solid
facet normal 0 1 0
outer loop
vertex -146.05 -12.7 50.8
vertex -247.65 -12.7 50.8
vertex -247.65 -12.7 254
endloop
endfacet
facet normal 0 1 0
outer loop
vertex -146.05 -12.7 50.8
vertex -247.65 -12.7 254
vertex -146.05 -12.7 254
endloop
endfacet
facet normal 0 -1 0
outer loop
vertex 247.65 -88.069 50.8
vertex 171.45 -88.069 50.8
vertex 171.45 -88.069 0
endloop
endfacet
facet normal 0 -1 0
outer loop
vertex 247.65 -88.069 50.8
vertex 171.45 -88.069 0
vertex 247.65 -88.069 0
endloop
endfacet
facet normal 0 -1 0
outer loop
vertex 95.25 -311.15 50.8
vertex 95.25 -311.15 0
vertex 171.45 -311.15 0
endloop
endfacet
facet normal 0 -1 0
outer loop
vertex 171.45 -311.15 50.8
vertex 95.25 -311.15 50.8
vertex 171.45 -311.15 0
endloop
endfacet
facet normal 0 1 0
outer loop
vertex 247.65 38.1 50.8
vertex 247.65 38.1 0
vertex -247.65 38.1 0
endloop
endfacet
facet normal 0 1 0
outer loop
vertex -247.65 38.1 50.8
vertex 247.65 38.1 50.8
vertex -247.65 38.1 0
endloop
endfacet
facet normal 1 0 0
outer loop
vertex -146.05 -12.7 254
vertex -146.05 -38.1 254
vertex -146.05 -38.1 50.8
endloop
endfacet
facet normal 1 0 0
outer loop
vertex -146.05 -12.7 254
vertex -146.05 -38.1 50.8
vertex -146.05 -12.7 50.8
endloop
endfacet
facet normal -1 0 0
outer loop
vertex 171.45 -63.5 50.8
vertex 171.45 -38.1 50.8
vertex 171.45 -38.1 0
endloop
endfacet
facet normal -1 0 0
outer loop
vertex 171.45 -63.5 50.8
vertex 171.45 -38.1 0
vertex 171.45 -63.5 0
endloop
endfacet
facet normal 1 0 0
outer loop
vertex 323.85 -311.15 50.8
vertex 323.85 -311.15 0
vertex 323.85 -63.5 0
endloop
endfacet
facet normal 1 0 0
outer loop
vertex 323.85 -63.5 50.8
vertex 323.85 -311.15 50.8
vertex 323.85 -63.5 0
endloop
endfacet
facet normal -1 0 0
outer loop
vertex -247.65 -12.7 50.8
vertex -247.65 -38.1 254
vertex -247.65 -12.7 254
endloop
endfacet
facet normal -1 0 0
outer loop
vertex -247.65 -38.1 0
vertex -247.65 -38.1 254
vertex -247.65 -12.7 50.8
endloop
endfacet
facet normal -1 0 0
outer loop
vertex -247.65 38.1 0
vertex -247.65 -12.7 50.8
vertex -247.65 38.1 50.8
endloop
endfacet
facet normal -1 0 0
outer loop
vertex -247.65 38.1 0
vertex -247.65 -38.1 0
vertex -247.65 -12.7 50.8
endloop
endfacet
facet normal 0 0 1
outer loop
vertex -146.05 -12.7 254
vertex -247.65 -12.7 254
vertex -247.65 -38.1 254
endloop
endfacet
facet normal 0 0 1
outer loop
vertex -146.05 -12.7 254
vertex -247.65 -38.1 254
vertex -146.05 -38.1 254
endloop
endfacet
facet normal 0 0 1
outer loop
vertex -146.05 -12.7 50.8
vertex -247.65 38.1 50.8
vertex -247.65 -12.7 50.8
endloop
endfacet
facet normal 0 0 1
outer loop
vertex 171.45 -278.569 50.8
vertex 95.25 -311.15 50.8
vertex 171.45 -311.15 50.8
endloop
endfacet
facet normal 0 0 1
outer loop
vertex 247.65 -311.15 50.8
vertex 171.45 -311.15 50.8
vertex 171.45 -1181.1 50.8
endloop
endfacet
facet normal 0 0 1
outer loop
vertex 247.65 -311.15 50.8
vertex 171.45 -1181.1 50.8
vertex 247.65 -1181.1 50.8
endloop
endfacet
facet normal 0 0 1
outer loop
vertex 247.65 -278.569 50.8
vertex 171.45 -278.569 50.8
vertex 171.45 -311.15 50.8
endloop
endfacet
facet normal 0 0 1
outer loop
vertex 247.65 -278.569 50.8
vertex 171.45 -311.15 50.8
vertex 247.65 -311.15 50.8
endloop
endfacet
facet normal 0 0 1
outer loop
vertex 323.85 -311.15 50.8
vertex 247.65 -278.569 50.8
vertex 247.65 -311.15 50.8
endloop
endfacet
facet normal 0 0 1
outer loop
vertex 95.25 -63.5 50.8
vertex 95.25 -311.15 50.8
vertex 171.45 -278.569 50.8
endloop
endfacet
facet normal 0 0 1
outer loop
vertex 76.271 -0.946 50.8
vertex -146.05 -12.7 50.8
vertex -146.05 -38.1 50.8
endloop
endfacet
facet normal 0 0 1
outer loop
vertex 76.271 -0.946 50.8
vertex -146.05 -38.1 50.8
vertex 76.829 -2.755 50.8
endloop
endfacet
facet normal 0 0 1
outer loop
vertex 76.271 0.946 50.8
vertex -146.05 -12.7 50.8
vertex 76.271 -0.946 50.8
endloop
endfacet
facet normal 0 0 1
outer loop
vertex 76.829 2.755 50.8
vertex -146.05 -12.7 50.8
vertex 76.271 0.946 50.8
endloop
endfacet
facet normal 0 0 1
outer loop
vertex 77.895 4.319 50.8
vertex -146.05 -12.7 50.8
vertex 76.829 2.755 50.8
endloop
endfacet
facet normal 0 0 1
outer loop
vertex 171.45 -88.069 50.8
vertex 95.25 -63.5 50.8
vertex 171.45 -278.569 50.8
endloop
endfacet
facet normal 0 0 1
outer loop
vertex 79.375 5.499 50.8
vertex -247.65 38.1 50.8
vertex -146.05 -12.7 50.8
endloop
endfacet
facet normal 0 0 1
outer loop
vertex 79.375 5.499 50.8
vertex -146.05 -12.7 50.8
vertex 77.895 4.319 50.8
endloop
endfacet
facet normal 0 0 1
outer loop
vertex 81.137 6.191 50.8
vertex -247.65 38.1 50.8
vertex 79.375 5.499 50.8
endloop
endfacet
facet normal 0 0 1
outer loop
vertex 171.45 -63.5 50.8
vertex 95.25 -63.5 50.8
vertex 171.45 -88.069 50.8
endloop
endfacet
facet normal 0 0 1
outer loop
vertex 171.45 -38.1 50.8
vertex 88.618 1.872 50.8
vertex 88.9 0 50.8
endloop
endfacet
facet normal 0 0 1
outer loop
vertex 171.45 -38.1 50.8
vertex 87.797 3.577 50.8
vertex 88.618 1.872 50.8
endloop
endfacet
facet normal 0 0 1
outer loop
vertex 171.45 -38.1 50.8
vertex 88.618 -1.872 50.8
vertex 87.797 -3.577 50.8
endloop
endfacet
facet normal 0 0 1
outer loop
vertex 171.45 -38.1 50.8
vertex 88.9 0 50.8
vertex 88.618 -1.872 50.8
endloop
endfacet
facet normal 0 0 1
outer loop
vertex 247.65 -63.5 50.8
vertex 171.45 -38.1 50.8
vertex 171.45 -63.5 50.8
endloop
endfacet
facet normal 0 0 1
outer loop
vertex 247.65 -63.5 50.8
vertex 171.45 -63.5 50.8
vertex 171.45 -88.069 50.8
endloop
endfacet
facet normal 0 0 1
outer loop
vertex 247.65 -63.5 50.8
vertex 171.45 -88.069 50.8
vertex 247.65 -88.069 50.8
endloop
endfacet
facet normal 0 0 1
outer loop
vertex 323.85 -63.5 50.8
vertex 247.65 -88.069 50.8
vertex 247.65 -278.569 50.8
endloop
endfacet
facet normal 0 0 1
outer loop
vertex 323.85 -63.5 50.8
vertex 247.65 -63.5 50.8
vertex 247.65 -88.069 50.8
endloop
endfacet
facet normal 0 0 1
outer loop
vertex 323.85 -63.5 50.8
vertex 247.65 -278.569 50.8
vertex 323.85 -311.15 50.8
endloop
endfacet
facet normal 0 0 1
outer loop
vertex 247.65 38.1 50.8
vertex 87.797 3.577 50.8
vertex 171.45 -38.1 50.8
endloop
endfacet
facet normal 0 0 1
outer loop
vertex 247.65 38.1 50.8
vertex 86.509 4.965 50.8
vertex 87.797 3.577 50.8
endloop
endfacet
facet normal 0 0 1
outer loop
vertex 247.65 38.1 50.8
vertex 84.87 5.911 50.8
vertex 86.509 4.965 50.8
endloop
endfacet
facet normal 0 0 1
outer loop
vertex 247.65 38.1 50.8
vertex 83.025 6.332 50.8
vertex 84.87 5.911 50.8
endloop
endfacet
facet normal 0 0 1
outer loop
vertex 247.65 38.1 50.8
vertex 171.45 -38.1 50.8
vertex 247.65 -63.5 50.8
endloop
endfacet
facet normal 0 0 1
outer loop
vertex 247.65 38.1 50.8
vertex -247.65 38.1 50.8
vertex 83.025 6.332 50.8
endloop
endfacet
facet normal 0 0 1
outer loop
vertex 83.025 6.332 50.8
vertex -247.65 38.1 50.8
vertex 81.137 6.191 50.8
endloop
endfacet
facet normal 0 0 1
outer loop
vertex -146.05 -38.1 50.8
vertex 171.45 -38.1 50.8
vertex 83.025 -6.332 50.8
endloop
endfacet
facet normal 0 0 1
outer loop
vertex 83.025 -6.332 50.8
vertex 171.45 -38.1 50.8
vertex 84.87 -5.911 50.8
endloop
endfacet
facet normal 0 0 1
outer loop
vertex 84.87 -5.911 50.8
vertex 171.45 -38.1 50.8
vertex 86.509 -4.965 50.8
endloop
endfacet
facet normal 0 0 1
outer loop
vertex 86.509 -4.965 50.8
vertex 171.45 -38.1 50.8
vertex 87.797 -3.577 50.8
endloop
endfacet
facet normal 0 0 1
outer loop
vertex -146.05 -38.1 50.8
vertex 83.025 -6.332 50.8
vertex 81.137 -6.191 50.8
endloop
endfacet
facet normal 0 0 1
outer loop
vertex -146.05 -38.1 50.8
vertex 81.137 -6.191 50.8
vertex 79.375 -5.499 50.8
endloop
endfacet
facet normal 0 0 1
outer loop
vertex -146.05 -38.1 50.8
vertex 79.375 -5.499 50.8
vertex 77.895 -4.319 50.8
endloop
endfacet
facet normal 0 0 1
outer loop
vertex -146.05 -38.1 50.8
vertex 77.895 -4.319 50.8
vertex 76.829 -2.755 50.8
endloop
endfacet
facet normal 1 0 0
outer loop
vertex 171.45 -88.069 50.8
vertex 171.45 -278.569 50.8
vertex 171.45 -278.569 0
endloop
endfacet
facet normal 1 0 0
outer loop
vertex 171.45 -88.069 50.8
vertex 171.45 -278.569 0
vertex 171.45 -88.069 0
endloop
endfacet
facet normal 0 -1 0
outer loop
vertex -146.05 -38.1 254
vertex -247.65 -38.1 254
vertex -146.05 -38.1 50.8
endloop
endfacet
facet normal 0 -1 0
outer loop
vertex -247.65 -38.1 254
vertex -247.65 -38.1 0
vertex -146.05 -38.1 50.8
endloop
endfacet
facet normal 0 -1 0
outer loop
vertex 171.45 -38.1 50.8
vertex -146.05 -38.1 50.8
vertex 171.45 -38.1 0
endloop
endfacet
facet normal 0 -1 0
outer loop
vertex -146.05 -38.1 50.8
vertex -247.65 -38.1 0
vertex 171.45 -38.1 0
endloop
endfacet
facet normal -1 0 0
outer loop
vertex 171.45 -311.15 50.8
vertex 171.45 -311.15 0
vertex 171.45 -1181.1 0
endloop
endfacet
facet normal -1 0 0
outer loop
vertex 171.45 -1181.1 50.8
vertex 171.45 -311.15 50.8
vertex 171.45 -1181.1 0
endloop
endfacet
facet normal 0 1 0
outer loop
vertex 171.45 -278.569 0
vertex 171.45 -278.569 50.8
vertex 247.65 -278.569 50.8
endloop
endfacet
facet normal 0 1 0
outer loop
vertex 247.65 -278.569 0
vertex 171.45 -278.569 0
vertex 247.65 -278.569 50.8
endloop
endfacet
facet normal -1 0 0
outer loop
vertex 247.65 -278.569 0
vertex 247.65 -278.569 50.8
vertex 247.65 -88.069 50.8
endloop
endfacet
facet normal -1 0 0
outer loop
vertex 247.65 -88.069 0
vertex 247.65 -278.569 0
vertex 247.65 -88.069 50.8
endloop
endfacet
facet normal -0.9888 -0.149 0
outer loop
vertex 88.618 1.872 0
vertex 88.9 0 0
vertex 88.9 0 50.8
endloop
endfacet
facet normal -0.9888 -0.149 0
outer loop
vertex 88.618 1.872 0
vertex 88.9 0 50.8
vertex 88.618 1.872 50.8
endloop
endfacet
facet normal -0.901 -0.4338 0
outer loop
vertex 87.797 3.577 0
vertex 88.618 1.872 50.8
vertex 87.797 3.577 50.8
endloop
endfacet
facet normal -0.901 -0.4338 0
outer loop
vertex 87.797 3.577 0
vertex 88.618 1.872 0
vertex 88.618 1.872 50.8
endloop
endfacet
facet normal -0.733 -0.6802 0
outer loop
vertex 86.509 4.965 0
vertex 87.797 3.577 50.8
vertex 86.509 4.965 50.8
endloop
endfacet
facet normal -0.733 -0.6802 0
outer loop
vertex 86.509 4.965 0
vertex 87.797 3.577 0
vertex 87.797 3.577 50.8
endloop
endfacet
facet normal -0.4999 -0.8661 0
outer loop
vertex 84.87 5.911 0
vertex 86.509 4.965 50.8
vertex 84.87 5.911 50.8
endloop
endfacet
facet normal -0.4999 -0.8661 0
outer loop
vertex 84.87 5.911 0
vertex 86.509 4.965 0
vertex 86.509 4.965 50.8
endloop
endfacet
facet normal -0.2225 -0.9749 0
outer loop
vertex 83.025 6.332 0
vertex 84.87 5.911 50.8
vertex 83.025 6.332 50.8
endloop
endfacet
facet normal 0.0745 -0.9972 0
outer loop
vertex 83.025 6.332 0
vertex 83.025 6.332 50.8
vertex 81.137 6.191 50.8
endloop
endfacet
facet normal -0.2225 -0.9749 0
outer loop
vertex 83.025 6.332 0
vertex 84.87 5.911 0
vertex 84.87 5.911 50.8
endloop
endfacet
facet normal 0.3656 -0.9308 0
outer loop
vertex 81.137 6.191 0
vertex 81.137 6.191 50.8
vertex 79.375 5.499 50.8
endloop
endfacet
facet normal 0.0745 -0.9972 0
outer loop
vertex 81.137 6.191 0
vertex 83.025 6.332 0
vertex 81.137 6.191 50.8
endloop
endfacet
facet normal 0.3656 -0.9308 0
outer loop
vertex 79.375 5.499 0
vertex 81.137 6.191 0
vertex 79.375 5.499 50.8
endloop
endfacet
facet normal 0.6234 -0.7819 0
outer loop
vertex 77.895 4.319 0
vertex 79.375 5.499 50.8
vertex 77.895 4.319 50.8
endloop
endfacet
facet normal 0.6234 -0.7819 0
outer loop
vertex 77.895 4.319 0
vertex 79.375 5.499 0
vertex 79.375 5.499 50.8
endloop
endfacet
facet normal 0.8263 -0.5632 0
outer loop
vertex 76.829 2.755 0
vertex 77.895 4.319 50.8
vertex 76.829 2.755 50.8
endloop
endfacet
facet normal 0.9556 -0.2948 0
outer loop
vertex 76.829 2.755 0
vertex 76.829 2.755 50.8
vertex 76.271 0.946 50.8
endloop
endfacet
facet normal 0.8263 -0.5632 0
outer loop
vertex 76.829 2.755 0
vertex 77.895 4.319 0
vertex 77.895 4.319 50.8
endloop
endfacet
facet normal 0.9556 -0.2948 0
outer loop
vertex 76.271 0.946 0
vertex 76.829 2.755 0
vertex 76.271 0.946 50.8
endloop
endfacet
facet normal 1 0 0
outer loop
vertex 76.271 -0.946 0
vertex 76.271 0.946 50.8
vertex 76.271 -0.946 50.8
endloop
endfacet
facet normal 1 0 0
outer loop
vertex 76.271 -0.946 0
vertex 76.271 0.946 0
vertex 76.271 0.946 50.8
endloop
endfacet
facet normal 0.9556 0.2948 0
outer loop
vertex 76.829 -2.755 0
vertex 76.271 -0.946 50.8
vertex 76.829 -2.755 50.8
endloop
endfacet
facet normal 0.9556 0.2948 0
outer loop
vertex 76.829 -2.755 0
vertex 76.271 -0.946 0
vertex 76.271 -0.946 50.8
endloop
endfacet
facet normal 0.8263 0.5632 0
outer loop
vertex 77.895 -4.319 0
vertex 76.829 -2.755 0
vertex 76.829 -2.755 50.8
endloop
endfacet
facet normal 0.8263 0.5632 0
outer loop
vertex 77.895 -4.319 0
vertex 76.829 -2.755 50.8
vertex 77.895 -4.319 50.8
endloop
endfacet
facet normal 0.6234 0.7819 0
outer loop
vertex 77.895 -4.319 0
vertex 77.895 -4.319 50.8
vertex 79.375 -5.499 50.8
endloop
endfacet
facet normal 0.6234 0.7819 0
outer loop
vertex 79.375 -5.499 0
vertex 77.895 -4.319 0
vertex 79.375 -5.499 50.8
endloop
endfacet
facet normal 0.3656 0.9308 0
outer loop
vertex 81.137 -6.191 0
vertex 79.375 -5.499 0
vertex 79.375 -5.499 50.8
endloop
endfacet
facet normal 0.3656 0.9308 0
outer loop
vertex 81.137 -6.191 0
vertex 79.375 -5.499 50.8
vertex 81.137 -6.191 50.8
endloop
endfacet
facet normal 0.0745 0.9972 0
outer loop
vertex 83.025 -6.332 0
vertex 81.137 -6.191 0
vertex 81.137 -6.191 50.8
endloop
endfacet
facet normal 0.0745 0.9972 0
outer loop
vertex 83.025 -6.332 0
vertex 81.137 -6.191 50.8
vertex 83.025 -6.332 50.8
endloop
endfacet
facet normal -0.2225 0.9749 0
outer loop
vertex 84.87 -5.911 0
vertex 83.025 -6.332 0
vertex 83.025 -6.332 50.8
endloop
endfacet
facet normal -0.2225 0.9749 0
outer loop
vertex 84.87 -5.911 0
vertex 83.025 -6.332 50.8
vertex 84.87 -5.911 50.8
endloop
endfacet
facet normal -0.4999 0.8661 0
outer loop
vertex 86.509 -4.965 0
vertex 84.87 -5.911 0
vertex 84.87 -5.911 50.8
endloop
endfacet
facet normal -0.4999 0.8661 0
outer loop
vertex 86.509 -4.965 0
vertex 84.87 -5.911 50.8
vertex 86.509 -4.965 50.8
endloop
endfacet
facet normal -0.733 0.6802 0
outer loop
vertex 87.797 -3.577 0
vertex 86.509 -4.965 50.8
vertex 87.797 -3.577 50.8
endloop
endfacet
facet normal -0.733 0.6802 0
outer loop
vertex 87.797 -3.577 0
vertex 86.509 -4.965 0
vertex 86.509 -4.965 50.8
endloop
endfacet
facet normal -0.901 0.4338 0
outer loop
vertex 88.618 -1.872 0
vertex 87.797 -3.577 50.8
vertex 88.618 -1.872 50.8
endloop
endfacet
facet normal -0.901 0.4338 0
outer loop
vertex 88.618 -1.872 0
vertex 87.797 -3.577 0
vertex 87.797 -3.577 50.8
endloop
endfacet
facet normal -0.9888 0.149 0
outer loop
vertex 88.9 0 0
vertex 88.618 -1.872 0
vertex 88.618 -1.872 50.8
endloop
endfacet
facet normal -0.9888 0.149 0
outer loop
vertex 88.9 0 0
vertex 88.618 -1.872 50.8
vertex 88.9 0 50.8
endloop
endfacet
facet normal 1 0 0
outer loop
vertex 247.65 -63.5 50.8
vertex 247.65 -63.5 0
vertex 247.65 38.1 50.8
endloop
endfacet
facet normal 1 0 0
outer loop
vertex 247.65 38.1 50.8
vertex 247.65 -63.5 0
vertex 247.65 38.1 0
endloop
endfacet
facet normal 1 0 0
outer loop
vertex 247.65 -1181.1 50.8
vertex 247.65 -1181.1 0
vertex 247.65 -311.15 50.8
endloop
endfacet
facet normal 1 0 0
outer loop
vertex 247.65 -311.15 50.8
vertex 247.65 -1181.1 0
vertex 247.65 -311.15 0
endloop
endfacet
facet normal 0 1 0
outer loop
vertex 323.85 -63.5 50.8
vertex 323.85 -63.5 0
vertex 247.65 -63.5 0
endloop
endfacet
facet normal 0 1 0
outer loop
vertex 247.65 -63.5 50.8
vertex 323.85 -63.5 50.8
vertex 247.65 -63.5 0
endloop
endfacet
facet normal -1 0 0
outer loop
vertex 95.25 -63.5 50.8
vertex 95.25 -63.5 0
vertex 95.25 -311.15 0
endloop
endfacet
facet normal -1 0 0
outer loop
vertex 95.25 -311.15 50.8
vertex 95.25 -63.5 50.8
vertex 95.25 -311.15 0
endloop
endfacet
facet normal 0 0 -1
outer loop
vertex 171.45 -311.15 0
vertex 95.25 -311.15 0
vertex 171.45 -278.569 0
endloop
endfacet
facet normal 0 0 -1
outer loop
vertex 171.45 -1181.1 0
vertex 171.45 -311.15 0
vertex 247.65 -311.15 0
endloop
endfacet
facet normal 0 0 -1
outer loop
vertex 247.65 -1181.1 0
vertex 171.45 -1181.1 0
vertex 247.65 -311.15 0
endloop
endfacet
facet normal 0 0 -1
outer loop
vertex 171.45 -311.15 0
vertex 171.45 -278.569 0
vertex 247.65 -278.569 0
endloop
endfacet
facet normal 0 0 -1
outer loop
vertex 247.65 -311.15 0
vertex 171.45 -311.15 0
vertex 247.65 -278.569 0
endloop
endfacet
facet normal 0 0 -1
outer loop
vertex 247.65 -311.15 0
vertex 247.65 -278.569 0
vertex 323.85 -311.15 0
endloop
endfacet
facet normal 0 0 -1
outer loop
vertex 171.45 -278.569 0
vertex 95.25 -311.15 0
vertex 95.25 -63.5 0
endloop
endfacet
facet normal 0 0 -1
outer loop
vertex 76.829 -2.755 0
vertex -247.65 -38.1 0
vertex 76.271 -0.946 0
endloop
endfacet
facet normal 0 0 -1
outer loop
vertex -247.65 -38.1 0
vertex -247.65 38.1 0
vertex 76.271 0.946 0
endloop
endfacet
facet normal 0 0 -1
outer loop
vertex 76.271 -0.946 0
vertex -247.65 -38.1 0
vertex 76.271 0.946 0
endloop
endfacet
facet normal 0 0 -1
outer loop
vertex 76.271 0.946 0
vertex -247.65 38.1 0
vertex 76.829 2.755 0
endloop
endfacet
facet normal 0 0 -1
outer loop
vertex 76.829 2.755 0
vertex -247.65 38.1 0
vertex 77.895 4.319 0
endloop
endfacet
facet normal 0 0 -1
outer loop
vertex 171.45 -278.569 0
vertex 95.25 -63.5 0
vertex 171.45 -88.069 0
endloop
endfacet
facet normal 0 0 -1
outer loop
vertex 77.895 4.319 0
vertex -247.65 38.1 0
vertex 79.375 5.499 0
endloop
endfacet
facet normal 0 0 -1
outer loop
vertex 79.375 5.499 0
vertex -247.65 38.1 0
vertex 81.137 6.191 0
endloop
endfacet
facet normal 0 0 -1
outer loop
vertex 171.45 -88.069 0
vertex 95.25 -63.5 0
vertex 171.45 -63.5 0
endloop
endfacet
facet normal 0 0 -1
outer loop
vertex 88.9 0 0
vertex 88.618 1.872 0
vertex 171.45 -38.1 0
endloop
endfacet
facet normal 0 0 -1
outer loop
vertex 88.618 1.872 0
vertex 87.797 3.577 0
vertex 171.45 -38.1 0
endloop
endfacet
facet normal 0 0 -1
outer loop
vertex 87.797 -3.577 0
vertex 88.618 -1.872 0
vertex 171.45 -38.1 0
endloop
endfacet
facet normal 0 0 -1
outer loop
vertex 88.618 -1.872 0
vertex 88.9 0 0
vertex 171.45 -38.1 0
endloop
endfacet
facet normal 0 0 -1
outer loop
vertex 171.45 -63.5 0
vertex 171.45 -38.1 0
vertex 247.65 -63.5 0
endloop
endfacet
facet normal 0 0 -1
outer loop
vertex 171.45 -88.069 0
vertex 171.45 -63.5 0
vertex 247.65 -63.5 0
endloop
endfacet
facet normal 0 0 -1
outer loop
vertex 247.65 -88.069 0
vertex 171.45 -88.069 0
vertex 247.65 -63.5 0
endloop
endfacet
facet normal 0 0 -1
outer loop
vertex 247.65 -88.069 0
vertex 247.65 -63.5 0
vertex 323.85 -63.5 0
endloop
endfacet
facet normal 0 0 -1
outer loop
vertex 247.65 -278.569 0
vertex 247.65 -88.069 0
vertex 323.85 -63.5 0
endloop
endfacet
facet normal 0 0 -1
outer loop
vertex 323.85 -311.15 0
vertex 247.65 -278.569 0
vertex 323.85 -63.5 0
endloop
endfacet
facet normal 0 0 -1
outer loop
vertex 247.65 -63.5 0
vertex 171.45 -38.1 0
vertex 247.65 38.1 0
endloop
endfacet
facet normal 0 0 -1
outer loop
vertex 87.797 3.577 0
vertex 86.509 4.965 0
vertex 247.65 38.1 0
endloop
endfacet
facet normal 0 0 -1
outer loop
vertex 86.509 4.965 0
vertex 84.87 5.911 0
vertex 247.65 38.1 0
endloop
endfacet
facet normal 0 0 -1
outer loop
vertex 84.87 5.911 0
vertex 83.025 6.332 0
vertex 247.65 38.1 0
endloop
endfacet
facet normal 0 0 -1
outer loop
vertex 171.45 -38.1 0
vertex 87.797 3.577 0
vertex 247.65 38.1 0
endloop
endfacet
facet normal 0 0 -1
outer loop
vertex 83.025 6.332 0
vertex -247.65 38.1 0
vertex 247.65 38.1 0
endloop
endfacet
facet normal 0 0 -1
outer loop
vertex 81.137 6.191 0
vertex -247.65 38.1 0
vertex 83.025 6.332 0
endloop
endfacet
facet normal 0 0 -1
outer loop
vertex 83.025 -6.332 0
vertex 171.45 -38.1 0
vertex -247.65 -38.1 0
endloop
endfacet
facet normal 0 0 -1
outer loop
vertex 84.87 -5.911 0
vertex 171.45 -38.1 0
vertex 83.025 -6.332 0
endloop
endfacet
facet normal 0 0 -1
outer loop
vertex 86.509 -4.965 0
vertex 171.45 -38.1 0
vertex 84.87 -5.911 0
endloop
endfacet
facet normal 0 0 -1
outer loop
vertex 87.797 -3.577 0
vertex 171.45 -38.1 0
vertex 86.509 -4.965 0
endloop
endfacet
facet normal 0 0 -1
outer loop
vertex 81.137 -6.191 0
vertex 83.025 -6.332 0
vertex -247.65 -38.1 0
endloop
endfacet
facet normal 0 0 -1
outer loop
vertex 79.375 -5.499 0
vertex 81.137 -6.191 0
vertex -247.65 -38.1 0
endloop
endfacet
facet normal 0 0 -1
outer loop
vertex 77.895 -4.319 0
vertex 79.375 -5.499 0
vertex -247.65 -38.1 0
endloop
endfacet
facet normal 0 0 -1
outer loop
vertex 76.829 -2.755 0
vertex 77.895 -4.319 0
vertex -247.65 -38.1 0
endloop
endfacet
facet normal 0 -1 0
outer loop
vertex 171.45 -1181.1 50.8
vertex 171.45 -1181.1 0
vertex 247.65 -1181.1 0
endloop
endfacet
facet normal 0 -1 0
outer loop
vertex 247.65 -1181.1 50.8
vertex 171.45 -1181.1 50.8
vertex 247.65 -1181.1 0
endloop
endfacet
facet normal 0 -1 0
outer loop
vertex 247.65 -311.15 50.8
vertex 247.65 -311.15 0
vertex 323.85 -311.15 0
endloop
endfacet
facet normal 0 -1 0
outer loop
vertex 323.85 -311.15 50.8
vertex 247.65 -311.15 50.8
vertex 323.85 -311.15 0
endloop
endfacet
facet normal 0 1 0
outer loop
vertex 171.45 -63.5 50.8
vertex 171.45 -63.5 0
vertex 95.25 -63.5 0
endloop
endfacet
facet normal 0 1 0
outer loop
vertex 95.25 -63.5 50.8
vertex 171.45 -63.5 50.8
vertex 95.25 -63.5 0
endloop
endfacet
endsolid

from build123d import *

# Parameters (mm, degrees)
F0_R     = 6.35
F1_DEPTH = 50.8
F2_W     = 101.6
F2_H     = 25.4
F3_DEPTH = 203.2
F4_W     = 76.2
F4_H     = 190.5
F5_DEPTH = 50.8


with BuildPart() as f1:
    # F0 (on Top) → F1 (new body)
    with BuildSketch(Plane.XY):
        Polygon((247.65, 38.1), (-247.65, 38.1), (-247.65, -38.1), (171.45, -38.1), (171.45, -63.5), (95.25, -63.5), (95.25, -311.15), (171.45, -311.15), (171.45, -1181.1), (247.65, -1181.1), (247.65, -311.15), (323.85, -311.15), (323.85, -63.5), (247.65, -63.5), (247.65, -38.1), align=None)
        with Locations((82.55, 0)):
            Circle(F0_R, mode=Mode.SUBTRACT)
    extrude(amount=F1_DEPTH)

    # F2 (on face) → F3 (join)
    with BuildSketch(Plane.XY.offset(50.8)):
        with Locations((-196.85, -25.4)):
            Rectangle(F2_W, F2_H)
    extrude(amount=F3_DEPTH)

    # F4 (on face) → F5 (cut)
    with BuildSketch(Plane.XY.offset(50.8)):
        with Locations((209.55, -183.31946)):
            Rectangle(F4_W, F4_H)
    extrude(amount=-F5_DEPTH, mode=Mode.SUBTRACT)


solid = f1.part
